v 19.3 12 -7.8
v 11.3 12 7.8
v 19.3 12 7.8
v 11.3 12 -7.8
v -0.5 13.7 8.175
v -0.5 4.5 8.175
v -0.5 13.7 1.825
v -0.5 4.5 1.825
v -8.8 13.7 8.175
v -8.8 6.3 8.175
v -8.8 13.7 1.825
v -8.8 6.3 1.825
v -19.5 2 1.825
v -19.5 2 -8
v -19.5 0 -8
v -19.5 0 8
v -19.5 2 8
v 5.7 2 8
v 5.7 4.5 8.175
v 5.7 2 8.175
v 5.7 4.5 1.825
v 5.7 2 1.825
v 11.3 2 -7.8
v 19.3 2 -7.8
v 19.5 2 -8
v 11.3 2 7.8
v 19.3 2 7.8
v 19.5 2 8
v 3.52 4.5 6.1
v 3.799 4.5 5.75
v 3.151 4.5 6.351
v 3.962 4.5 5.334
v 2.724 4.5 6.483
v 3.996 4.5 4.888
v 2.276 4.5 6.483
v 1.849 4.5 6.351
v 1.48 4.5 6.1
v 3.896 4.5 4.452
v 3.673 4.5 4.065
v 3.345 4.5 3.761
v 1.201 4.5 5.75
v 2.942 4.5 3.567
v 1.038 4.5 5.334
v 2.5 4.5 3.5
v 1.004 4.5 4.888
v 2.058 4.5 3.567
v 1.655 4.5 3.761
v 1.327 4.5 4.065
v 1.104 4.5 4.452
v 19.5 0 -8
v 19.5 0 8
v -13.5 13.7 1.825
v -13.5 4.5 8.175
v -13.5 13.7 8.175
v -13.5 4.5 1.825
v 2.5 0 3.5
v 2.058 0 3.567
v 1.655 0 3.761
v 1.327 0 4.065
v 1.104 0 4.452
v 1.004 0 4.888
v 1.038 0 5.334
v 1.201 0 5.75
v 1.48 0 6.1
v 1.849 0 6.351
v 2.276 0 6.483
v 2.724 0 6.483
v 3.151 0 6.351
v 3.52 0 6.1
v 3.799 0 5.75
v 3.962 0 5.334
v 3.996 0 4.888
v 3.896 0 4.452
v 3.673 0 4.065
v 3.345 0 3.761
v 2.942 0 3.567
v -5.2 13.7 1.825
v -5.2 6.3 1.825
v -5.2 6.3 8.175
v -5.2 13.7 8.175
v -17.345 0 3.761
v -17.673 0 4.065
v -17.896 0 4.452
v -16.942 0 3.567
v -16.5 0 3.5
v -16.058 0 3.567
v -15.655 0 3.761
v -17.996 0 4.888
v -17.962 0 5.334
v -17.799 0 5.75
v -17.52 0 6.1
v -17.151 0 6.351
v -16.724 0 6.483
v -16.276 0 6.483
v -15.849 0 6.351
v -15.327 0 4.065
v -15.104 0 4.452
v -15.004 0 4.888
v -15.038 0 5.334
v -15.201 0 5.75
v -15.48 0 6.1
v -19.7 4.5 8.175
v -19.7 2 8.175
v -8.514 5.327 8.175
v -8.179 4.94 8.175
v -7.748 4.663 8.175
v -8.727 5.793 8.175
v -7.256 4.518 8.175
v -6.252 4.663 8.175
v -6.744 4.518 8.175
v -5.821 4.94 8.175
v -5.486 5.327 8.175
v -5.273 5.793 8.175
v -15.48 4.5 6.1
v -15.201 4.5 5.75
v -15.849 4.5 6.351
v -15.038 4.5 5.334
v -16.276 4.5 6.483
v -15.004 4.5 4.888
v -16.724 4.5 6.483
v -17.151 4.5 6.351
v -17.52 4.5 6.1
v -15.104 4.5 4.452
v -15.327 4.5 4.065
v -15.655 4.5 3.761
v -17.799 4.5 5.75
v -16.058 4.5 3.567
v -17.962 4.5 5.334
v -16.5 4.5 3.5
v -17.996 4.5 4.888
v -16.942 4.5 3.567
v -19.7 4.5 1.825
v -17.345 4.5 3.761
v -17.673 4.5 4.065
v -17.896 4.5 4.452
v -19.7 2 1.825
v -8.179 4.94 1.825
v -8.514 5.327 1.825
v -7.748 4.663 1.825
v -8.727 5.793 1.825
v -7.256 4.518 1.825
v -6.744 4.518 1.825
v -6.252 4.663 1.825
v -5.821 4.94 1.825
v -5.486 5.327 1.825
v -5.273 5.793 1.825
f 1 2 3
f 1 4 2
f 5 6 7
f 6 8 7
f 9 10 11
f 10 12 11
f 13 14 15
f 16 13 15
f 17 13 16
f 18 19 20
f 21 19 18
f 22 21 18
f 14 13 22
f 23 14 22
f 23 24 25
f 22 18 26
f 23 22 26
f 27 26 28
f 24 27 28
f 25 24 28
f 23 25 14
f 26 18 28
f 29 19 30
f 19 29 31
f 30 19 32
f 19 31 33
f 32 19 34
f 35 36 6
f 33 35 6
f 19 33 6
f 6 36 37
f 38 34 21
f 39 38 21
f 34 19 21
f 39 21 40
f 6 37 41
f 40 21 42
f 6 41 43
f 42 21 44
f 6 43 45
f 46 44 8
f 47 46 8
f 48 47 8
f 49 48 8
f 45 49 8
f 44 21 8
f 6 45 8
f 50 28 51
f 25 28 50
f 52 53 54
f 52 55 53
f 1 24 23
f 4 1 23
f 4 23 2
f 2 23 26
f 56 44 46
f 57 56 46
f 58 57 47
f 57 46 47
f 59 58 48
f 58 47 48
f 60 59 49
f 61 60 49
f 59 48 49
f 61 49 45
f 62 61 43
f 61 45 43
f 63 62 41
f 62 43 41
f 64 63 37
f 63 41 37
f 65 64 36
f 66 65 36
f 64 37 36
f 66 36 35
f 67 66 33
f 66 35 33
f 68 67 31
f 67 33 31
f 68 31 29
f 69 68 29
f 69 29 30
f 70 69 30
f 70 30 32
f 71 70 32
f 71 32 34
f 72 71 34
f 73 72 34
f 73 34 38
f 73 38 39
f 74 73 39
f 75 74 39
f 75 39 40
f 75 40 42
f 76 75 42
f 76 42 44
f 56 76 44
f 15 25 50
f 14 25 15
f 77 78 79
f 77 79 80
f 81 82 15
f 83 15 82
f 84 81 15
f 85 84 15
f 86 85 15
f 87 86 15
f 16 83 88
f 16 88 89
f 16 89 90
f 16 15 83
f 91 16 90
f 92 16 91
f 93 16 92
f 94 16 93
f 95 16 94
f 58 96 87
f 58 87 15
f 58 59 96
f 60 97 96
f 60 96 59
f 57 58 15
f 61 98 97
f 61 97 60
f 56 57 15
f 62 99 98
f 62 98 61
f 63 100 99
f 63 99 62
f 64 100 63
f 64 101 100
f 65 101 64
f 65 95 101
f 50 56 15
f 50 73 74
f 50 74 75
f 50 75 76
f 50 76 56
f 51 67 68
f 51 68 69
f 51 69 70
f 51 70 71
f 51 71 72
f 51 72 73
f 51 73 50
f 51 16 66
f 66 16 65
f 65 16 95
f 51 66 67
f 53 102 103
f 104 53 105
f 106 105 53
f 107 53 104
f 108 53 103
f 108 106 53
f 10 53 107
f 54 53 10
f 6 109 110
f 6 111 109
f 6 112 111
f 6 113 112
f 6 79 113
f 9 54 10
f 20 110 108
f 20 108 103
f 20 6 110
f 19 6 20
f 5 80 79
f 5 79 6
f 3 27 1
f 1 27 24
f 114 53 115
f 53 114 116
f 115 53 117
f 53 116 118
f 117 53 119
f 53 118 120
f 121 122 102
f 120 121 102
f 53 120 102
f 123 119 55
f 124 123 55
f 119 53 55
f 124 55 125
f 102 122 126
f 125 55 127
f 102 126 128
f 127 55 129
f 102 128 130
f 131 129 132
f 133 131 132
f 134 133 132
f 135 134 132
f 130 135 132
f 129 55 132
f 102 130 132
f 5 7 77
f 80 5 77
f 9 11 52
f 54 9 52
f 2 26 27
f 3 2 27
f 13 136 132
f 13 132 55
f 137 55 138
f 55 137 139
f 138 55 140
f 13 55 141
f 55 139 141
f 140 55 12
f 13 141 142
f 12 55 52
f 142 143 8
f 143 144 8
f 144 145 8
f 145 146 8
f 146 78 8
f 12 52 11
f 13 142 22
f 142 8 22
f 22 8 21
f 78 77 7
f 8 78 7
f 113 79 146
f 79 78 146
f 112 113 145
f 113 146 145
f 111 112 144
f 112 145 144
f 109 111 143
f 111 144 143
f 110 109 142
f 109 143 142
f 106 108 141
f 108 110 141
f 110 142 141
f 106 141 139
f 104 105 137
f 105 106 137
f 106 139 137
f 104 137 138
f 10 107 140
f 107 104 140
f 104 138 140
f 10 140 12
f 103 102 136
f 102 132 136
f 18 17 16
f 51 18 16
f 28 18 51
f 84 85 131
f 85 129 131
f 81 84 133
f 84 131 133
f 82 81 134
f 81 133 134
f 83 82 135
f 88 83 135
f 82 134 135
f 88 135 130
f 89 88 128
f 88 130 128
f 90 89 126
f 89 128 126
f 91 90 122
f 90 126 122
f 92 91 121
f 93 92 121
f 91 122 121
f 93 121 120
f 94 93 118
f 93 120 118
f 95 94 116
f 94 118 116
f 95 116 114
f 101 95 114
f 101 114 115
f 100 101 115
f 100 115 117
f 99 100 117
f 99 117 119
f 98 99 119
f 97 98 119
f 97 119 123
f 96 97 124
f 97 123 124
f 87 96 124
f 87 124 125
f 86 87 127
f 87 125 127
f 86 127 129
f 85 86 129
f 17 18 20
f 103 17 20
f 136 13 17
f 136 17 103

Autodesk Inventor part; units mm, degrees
ref_plane "YZ Plane" through (0, 0, 0) normal (1, 0, 0) x (0, 1, 0)
ref_plane "XZ Plane" through (0, 0, 0) normal (0, 1, 0) x (-1, 0, 0)
ref_plane "Work Plane1" through (0, 0, 1.825) normal (0, 0, 1) x (1, 0, 0)
sketch "Sketch1" plane through (0, 0, 1.825) normal (0, 0, 1) x (1, 0, 0)
  line L0 (5.7, 2) -> (-19.7, 2)
  line L1 (5.7, 4.5) -> (5.7, 2)
  line L2 (-0.5, 13.7) -> (-5.2, 13.7)
  line L3 (-8.8, 6.3) -> (-8.8, 13.7)
  line L4 (-13.5, 4.5) -> (-19.7, 4.5)
  line L5 (5.7, 4.5) -> (-0.5, 4.5)
  line L6 (-5.2, 6.3) -> (-5.2, 13.7)
  line L7 (-8.8, 13.7) -> (-13.5, 13.7)
  line L8 (-19.7, 4.5) -> (-19.7, 2)
  line L9 (-0.5, 4.5) -> (-0.5, 13.7)
  arc A0 (-8.8, 6.3) -> (-5.2, 6.3) centre (-7, 6.3) ccw
  line L10 (-13.5, 4.5) -> (-13.5, 13.7)
extrude "Extrusion3" add sketch "Sketch1" along normal blind 6.35
sketch "Sketch2" plane through (-19.7, 2, 1.825) normal (0, -1, 0) x (1, 0, 0)
  line L0 (0.2, 0) -> (0.2, 6.175)
  line L1 (0.2, 6.175) -> (25.4, 6.175)
  line L2 (25.4, 6.175) -> (39.2, 6.175)
  line L3 (39.2, 6.175) -> (39.2, -9.825)
  line L4 (39.2, -9.825) -> (0.2, -9.825)
  line L5 (0.2, -9.825) -> (0.2, 0)
extrude "Extrusion2" add sketch "Sketch2" along normal blind 2
hole "Hole2" at (-16.5, 0, 5) direction (0, 1, 0) diameter 3 depth 4.5
sketch "Sketch3" plane through (0, 0, 0) normal (0, 1, 0) x (-1, 0, 0)
  point P0 (16.5, 5)
hole "Hole1" at (2.5, 0, 5) direction (0, 1, 0) diameter 3 depth 4.5
sketch "Sketch5" plane through (-19.7, 2, 1.825) normal (0, 1, 0) x (1, 0, 0)
  line L0 (31, -5.975) -> (39, -5.975)
  line L1 (39, -5.975) -> (39, 9.625)
  line L2 (31, 9.625) -> (31, -5.975)
  line L3 (39, 9.625) -> (31, 9.625)
extrude "Extrusion1" add sketch "Sketch5" along normal blind 10
sketch "Sketch4" plane through (0, 0, 0) normal (0, 1, 0) x (-1, 0, 0)
  point P0 (-2.5, 5)
properties part number "Endstop"
